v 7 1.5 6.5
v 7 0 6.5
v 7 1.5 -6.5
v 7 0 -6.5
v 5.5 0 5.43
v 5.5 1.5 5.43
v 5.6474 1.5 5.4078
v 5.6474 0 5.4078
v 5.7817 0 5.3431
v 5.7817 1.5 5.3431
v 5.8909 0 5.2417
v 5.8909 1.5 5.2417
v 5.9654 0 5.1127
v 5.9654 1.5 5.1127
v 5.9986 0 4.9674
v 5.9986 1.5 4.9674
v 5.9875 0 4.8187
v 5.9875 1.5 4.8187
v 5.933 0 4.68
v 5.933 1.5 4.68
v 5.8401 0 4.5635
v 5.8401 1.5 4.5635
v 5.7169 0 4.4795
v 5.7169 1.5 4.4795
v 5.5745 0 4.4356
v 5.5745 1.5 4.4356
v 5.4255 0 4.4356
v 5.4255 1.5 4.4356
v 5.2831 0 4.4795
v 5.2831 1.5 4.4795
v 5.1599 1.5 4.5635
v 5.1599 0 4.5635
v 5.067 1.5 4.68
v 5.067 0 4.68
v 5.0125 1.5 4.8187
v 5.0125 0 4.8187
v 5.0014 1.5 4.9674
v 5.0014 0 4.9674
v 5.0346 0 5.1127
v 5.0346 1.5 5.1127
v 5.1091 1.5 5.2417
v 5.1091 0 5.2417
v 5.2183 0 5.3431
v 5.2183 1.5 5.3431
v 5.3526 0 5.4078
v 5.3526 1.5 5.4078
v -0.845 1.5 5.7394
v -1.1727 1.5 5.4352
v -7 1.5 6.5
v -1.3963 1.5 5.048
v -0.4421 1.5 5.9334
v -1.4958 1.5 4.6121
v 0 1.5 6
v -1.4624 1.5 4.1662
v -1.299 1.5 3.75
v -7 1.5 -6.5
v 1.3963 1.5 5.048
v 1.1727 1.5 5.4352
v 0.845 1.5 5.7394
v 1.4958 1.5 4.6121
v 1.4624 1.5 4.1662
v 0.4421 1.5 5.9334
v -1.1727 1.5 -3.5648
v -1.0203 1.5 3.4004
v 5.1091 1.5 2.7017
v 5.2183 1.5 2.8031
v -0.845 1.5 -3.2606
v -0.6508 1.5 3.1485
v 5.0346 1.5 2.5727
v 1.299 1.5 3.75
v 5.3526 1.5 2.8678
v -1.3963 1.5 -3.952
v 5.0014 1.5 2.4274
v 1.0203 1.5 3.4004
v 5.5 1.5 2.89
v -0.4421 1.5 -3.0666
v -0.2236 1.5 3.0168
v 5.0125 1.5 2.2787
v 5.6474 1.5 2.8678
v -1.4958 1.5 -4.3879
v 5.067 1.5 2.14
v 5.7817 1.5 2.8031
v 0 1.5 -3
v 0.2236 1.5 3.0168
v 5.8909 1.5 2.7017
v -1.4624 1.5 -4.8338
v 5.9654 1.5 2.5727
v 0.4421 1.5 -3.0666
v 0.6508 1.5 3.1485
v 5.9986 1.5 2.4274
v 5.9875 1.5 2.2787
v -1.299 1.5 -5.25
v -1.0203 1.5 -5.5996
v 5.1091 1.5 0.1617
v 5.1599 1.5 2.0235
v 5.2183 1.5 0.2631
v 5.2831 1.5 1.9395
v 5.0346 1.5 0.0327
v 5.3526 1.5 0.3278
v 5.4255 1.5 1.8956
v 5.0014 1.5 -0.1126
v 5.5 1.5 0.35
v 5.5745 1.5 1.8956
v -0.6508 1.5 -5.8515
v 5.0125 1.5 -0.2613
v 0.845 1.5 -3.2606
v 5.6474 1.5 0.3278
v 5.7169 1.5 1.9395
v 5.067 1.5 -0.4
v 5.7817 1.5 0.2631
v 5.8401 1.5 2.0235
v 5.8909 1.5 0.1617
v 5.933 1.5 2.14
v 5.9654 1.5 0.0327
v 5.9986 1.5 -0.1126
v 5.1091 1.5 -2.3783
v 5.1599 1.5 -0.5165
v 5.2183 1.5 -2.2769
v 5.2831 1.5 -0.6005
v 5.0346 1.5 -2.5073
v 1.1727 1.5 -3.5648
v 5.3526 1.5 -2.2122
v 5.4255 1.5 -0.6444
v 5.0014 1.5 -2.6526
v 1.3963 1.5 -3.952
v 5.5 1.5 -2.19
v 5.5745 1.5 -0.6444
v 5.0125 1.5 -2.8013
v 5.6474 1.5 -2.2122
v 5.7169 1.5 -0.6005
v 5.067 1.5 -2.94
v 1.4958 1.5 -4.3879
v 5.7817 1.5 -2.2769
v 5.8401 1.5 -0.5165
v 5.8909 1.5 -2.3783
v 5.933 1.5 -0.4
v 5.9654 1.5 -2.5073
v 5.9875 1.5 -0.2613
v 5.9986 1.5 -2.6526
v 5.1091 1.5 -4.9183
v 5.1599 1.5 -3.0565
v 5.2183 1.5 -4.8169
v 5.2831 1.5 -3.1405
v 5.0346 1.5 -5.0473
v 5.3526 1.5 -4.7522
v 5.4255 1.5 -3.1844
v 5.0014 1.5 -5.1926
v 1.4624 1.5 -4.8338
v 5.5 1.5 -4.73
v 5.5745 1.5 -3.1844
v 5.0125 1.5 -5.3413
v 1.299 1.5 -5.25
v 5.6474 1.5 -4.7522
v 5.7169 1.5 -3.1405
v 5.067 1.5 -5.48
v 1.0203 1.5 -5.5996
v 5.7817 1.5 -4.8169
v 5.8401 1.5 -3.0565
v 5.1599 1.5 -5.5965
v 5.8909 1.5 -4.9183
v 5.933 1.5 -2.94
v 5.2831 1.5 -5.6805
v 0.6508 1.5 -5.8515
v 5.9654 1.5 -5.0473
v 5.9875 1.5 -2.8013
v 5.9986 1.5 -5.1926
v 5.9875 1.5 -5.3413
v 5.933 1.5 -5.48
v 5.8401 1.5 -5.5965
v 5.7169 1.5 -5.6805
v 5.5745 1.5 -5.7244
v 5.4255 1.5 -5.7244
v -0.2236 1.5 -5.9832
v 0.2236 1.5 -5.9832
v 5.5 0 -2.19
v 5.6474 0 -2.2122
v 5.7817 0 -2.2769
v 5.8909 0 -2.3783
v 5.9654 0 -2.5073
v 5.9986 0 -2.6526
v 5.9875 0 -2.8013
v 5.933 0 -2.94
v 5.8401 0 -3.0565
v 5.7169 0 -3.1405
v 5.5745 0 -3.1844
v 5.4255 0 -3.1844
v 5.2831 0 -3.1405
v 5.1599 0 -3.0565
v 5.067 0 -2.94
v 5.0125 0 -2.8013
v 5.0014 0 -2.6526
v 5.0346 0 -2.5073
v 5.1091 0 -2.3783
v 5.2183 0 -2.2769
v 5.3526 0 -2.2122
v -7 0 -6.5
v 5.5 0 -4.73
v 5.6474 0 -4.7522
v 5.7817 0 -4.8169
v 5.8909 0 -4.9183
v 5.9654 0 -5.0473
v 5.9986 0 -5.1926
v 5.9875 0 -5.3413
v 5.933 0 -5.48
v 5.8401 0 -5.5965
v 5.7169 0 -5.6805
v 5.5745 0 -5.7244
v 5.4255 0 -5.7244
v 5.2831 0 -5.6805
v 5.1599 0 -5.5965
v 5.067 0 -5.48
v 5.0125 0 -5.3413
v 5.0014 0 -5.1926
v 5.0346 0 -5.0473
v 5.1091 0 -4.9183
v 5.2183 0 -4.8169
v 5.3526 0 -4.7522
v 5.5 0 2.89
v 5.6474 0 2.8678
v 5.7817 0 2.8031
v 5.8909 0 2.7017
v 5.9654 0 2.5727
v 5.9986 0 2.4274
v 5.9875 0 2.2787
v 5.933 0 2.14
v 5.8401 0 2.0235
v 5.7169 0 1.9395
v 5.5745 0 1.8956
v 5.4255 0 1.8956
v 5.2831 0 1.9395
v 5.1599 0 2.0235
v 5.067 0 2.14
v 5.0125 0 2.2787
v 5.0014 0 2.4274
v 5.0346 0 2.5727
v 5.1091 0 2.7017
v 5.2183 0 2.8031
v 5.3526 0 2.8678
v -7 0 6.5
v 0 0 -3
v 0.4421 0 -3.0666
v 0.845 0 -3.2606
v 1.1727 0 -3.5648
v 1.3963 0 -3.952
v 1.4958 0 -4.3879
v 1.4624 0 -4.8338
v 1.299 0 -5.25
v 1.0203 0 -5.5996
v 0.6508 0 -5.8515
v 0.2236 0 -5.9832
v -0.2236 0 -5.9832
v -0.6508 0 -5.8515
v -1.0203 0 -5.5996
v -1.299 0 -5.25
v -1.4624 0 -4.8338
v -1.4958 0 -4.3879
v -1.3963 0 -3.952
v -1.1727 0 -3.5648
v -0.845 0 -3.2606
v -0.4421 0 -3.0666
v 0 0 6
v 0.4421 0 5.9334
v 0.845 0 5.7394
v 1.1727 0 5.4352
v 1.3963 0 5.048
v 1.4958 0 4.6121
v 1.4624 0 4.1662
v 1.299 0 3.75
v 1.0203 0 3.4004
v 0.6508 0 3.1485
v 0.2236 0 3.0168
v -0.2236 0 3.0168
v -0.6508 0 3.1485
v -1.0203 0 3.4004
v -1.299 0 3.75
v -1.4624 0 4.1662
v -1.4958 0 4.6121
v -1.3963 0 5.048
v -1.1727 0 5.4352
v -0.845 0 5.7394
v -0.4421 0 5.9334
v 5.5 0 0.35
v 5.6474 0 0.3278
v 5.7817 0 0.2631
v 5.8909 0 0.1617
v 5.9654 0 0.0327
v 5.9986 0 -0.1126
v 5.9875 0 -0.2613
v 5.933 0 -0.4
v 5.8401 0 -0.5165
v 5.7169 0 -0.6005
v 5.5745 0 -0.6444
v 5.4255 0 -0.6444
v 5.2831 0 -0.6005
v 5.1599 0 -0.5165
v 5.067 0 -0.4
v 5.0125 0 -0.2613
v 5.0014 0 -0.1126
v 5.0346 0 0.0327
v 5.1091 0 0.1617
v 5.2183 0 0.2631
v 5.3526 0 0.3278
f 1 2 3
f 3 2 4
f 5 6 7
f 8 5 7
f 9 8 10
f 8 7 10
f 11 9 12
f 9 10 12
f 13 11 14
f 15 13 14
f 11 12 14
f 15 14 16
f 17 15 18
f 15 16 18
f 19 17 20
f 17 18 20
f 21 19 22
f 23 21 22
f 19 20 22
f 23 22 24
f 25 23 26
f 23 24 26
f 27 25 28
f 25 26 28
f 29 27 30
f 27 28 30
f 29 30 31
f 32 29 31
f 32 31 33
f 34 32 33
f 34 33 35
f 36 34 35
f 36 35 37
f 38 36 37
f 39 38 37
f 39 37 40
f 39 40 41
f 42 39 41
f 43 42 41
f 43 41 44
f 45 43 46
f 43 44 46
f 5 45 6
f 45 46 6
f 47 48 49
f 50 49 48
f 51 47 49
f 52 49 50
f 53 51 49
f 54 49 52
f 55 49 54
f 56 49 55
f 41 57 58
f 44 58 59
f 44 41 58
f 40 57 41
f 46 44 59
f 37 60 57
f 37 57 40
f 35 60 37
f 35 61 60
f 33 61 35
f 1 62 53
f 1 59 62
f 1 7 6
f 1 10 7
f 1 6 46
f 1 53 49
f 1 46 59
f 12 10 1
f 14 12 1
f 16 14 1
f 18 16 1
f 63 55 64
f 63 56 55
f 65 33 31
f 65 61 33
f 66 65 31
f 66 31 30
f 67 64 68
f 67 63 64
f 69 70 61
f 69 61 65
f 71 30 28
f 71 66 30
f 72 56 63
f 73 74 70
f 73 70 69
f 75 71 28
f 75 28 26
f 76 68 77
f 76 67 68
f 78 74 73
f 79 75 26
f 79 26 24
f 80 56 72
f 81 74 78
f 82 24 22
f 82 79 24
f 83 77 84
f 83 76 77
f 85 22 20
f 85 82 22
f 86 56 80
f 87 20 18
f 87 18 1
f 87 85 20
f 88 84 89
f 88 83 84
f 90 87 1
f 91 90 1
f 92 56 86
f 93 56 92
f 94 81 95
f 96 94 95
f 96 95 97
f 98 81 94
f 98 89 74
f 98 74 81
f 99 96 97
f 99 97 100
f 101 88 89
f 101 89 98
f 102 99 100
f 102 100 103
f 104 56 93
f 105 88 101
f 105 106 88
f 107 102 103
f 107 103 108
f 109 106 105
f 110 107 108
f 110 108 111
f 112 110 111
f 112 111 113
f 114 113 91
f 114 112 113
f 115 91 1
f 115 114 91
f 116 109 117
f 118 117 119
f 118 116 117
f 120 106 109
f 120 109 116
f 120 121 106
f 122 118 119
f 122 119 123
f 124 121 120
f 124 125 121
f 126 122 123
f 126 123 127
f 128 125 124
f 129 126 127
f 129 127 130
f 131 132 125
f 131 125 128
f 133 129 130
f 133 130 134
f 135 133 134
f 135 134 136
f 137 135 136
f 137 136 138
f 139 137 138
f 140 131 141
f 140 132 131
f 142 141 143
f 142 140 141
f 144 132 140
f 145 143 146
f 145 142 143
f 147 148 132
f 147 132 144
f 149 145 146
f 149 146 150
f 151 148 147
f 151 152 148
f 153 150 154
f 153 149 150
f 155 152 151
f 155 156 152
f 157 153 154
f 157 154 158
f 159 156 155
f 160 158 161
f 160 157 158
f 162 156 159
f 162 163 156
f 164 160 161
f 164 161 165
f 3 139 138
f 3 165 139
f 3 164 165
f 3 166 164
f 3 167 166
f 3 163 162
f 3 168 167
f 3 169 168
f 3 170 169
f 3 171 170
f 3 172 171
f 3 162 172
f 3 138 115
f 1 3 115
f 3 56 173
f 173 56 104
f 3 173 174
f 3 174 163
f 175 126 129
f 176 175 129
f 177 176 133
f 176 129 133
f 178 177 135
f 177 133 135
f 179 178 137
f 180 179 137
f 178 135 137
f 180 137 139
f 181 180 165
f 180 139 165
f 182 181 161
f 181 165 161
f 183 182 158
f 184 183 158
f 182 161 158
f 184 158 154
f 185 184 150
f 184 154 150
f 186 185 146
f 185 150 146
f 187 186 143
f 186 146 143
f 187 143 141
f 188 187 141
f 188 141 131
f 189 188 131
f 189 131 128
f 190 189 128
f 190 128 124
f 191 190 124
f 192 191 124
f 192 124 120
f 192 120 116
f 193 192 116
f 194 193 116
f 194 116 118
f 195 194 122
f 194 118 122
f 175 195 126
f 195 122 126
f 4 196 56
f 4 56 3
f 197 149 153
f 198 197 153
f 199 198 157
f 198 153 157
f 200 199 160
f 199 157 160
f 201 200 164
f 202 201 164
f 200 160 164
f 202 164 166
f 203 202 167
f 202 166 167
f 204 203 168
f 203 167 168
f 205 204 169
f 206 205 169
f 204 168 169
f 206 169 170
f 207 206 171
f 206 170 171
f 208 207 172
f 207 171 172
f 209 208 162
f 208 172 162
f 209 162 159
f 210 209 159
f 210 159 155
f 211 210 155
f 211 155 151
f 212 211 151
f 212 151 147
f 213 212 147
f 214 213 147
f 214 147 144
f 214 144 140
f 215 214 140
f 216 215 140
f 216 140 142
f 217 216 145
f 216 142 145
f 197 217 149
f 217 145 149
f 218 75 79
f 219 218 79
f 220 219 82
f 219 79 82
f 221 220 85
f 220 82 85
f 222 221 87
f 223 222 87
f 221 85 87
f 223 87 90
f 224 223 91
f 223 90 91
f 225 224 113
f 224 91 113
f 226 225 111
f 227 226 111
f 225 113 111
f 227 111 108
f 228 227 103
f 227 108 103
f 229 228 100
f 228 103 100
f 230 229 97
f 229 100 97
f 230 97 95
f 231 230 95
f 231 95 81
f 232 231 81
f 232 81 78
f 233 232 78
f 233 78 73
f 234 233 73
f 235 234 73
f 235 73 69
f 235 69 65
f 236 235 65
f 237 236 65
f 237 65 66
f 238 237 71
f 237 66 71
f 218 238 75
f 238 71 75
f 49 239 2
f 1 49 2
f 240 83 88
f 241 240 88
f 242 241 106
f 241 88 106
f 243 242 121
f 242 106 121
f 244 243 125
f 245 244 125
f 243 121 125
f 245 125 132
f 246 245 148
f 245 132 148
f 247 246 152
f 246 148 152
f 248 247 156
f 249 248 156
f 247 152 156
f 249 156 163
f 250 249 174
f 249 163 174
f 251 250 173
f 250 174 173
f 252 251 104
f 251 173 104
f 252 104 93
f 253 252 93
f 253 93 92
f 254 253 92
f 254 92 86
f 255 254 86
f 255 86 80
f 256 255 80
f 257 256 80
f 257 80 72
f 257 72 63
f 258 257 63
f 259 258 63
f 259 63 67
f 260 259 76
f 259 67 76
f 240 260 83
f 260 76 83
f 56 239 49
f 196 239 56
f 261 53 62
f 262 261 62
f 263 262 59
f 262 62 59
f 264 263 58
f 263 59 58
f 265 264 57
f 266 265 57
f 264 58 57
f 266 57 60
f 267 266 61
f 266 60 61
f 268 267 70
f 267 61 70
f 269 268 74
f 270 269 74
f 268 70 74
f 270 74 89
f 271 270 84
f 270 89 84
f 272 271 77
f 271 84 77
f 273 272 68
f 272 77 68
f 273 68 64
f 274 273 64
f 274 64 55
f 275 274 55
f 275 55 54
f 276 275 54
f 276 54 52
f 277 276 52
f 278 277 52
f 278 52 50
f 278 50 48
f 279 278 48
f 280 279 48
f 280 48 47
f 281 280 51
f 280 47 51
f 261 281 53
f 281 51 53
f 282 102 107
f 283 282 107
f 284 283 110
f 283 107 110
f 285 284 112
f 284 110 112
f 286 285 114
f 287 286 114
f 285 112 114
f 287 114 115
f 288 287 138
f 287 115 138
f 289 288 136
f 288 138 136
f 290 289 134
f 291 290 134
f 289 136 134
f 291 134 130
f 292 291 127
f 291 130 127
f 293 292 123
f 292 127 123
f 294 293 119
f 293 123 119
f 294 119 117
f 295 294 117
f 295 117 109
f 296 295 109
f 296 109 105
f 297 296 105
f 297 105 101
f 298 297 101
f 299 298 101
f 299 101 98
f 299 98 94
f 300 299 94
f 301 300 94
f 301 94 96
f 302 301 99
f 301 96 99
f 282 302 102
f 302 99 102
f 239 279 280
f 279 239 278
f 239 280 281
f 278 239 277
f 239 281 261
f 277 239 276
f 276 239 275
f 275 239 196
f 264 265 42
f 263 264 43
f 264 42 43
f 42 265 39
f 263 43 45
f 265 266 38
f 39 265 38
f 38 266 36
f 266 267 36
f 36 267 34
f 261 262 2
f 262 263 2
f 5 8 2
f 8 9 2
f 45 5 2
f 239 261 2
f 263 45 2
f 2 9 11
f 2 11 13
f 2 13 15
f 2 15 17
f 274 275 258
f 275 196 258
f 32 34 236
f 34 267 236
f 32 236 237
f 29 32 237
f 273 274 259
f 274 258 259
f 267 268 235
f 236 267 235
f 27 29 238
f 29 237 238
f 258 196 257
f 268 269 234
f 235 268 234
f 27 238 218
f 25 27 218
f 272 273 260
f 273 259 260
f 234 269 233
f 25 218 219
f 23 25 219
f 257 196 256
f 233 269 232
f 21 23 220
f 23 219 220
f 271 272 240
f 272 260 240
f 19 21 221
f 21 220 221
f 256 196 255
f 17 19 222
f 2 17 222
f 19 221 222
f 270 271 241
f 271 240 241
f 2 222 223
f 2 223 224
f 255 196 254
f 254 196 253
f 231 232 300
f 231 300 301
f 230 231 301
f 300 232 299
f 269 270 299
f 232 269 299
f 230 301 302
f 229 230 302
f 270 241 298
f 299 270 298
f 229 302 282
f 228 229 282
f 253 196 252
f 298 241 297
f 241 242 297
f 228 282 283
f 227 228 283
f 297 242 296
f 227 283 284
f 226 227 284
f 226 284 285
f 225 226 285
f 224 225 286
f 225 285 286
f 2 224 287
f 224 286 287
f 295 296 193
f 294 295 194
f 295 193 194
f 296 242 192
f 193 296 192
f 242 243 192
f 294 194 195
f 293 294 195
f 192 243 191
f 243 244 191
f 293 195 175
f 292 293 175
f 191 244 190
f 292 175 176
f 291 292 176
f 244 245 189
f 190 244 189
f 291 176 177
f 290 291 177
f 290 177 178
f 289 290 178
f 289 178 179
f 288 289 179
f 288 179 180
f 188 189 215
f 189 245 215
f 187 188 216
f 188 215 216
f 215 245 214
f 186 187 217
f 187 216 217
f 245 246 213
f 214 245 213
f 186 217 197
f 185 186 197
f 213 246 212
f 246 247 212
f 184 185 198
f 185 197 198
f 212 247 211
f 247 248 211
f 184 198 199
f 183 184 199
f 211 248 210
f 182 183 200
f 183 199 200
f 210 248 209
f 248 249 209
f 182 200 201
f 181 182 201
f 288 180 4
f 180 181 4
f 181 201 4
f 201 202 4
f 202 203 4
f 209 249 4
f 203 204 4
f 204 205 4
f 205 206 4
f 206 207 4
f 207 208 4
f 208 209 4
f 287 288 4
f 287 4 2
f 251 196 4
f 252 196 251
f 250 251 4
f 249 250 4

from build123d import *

# Parameters (mm, degrees)
SKETCH1_W           = 14
SKETCH1_H           = 13
BOSS_EXTRUDE1_DEPTH = 1.5
SKETCH2_R           = 1.5
SKETCH2_R_2         = 0.5
CUT_EXTRUDE1_DEPTH  = 1.5


with BuildPart() as part:
    # Sketch1 → Boss-Extrude1 (new body)
    with BuildSketch(Plane(origin=(0, 0, 0), x_dir=(1, 0, 0), z_dir=(0, 1, 0))):
        Rectangle(SKETCH1_W, SKETCH1_H)
    extrude(amount=BOSS_EXTRUDE1_DEPTH)

    # Sketch2 → Cut-Extrude1 (cut)
    with BuildSketch(Plane(origin=(0, 1.5, 0), x_dir=(1, 0, 0), z_dir=(0, 1, 0))):
        with Locations(Location((0, 4.5, 0), (0, 0, 270))):
            Circle(SKETCH2_R)
        with Locations(Location((0, -4.5, 0), (0, 0, 270))):
            Circle(SKETCH2_R)
        with Locations(Location((5.5, -4.93, 0), (0, 0, 270))):
            Circle(SKETCH2_R_2)
        with Locations(Location((5.5, -2.39, 0), (0, 0, 270))):
            Circle(SKETCH2_R_2)
        with Locations(Location((5.5, 0.15, 0), (0, 0, 270))):
            Circle(SKETCH2_R_2)
        with Locations(Location((5.5, 2.69, 0), (0, 0, 270))):
            Circle(SKETCH2_R_2)
        with Locations(Location((5.5, 5.23, 0), (0, 0, 270))):
            Circle(SKETCH2_R_2)
    extrude(amount=-CUT_EXTRUDE1_DEPTH, mode=Mode.SUBTRACT)


solid = part.part
